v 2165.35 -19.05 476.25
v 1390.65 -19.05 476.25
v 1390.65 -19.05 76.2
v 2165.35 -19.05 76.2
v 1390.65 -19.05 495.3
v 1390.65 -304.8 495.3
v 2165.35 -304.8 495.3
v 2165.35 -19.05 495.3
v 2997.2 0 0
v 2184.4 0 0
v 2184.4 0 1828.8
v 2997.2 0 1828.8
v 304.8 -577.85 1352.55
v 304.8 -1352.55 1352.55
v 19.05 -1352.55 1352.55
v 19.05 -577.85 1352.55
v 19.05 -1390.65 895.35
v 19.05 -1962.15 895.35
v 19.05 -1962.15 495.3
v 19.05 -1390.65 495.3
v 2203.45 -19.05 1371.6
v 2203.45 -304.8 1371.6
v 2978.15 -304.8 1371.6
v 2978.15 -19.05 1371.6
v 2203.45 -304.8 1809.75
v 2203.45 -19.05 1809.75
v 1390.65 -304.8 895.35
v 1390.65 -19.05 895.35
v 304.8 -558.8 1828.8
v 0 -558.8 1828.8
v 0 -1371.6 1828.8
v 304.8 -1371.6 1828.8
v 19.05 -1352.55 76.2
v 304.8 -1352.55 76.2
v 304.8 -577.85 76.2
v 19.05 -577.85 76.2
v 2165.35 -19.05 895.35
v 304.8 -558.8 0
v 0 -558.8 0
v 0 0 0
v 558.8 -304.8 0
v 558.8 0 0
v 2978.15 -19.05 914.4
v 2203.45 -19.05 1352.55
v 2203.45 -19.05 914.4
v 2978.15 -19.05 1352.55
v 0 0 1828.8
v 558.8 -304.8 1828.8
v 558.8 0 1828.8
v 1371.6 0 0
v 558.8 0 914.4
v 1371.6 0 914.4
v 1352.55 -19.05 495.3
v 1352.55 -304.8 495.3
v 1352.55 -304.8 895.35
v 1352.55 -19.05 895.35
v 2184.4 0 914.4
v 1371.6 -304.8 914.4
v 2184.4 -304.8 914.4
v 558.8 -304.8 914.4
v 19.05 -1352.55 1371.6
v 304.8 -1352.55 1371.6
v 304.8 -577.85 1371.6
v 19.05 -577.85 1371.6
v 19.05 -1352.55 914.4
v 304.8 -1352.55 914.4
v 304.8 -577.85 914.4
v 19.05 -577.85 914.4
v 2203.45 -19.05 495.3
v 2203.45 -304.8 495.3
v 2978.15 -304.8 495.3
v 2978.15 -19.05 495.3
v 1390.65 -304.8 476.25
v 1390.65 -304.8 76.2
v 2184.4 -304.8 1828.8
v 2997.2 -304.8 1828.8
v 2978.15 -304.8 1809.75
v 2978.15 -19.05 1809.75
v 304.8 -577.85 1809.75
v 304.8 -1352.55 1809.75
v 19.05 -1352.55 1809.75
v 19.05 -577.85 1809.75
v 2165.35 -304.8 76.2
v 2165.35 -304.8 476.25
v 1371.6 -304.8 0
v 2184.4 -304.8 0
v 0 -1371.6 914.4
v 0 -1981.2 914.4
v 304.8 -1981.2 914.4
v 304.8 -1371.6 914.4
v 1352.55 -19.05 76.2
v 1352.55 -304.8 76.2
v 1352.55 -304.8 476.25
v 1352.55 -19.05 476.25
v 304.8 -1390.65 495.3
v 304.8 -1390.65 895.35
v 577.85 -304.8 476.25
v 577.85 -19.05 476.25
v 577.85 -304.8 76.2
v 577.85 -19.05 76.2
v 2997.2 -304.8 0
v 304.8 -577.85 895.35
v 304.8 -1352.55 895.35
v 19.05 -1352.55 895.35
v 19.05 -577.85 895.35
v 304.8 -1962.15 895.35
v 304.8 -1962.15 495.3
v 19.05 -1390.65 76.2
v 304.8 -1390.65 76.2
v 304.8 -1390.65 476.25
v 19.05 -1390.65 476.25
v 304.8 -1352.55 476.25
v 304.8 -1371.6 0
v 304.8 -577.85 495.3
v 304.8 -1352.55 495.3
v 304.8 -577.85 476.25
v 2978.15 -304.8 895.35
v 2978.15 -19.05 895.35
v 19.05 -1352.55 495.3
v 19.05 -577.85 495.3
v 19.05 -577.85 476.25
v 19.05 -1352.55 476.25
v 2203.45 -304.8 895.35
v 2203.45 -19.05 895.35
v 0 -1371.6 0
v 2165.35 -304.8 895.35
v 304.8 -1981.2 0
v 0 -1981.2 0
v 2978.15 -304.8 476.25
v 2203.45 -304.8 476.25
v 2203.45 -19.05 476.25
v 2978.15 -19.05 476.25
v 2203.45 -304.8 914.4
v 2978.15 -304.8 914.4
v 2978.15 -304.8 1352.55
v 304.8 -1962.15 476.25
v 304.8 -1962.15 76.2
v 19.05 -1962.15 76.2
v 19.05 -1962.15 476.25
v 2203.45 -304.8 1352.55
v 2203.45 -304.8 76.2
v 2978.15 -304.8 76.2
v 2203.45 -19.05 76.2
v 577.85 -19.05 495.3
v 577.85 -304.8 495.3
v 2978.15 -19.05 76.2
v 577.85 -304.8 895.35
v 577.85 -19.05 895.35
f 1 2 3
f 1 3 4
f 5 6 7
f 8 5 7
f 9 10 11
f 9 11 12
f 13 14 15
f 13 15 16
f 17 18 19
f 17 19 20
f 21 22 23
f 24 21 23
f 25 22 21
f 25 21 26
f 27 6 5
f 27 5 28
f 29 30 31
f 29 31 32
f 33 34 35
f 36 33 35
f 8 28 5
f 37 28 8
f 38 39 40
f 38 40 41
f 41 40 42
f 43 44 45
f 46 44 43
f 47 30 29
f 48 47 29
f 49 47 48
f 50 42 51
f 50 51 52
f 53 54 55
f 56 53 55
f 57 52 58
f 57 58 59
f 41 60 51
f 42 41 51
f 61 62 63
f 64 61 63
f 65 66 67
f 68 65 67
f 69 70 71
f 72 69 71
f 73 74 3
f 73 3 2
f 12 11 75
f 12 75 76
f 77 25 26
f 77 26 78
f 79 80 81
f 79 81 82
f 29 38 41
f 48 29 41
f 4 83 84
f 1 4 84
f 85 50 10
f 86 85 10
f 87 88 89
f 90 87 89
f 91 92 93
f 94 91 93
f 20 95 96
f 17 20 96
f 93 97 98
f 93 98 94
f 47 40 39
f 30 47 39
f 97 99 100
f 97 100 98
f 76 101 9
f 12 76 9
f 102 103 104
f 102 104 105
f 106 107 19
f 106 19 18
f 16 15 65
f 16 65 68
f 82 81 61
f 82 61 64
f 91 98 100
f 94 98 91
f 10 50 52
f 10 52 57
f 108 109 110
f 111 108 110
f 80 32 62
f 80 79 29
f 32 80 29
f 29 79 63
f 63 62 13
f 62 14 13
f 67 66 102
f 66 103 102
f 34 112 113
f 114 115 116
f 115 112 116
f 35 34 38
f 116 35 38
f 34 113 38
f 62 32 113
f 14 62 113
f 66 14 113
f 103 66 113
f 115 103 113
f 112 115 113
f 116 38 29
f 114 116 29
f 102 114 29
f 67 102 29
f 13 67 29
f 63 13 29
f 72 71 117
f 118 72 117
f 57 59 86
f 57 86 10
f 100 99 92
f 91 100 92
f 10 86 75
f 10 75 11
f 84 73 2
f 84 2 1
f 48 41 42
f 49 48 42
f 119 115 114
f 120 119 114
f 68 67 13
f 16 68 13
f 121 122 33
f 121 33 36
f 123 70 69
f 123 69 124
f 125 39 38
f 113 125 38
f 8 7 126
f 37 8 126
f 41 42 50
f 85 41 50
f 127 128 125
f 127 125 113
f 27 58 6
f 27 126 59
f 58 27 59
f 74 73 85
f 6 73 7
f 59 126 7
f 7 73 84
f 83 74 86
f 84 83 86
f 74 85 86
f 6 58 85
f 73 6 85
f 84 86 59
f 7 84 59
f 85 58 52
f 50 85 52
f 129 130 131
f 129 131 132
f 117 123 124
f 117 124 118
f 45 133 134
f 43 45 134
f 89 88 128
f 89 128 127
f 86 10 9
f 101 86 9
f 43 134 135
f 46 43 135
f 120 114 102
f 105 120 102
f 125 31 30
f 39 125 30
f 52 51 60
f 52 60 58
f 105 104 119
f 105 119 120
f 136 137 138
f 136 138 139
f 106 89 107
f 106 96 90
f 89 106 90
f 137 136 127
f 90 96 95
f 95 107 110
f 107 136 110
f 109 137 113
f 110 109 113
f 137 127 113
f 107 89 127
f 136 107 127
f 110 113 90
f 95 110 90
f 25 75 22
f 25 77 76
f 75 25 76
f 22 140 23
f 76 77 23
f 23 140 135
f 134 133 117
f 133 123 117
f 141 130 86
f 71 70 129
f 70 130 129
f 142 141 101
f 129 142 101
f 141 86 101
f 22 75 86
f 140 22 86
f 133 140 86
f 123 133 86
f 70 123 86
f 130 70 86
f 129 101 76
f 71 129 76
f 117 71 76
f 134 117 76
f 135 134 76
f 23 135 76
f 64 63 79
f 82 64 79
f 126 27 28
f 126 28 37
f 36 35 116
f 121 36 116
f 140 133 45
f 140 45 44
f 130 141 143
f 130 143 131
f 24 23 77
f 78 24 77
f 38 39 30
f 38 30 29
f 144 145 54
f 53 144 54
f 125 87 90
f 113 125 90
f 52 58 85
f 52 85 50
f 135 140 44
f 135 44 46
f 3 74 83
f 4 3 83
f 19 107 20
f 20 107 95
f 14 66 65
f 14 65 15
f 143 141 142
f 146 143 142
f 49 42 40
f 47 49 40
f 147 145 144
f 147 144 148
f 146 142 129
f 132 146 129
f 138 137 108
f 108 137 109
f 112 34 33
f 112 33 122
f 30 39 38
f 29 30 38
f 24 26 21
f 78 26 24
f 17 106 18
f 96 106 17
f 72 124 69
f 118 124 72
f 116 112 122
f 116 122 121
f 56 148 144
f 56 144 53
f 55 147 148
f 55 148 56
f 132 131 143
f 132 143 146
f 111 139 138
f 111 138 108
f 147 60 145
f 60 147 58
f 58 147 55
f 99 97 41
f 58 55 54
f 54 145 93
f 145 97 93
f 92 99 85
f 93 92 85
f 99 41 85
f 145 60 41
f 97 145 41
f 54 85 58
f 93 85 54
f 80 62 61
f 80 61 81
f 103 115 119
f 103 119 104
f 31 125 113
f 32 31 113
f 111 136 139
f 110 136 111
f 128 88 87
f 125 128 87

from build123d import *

# Parameters (mm, degrees)
F0_W      = 304.8
F0_H      = 609.6
F1_DEPTH  = 914.4
F0_H_2    = 812.8
F2_DEPTH  = 1828.8
F3_DEPTH  = 1828.8
F0_W_2    = 812.8
F0_H_3    = 304.8
F4_DEPTH  = 914.4
F5_DEPTH  = 914.4
F6_DEPTH  = 1828.8
F7_W      = 571.5
F7_H      = 400.05
F7_W_2    = 774.7
F7_H_2    = 438.15
F8_DEPTH  = 285.75
F9_W      = 774.7
F9_H      = 400.05
F9_H_2    = 438.15
F10_DEPTH = 285.75


with BuildPart() as f1:
    # F0 (on Top) → F1 (new body)
    with BuildSketch(Plane.XY):
        with Locations((152.4, -1676.4)):
            Rectangle(F0_W, F0_H)
    extrude(amount=F1_DEPTH)


with BuildPart() as f2:
    # F0 (on Top) → F2 (new body)
    with BuildSketch(Plane.XY):
        with Locations((152.4, -965.2)):
            Rectangle(F0_W, F0_H_2)
    extrude(amount=F2_DEPTH)


with BuildPart() as f3:
    # F0 (on Top) → F3 (new body)
    with BuildSketch(Plane.XY):
        Polygon((558.8, 0), (0, 0), (0, -558.8), (304.8, -558.8), (558.8, -304.8), align=None)
    extrude(amount=F3_DEPTH)


with BuildPart() as f4:
    # F0 (on Top) → F4 (new body)
    with BuildSketch(Plane.XY):
        with Locations((965.2, -152.4)):
            Rectangle(F0_W_2, F0_H_3)
    extrude(amount=F4_DEPTH)


with BuildPart() as f5:
    # F0 (on Top) → F5 (new body)
    with BuildSketch(Plane.XY):
        with Locations((1778, -152.4)):
            Rectangle(F0_W_2, F0_H_3)
    extrude(amount=F5_DEPTH)


with BuildPart() as f6:
    # F0 (on Top) → F6 (new body)
    with BuildSketch(Plane.XY):
        with Locations((2590.8, -152.4)):
            Rectangle(F0_W_2, F0_H_3)
    extrude(amount=F6_DEPTH)


with BuildPart() as f8_tool:
    # F7 (on face) → F8 (new body)
    with BuildSketch(Plane.YZ.offset(304.8)):
        with Locations((-1676.4, 695.325)):
            Rectangle(F7_W, F7_H)
        with Locations((-1676.4, 276.225)):
            Rectangle(F7_W, F7_H)
        with Locations((-965.2, 276.225)):
            Rectangle(F7_W_2, F7_H)
        with Locations((-965.2, 695.325)):
            Rectangle(F7_W_2, F7_H)
        with Locations((-965.2, 1133.475)):
            Rectangle(F7_W_2, F7_H_2)
        with Locations((-965.2, 1590.675)):
            Rectangle(F7_W_2, F7_H_2)
    extrude(amount=-F8_DEPTH)


with BuildPart() as f1_1:
    add(f1.part)

    # F8: cut by f8_tool
    add(f8_tool.part, mode=Mode.SUBTRACT)


with BuildPart() as f2_1:
    add(f2.part)

    # F8: cut by f8_tool
    add(f8_tool.part, mode=Mode.SUBTRACT)


with BuildPart() as f10_tool:
    # F9 (on face) → F10 (new body)
    with BuildSketch(Plane.XZ.offset(304.8)):
        with Locations((965.2, 695.325)):
            Rectangle(F9_W, F9_H)
        with Locations((1778, 695.325)):
            Rectangle(F9_W, F9_H)
        with Locations((2590.8, 695.325)):
            Rectangle(F9_W, F9_H)
        with Locations((965.2, 276.225)):
            Rectangle(F9_W, F9_H)
        with Locations((1778, 276.225)):
            Rectangle(F9_W, F9_H)
        with Locations((2590.8, 276.225)):
            Rectangle(F9_W, F9_H)
        with Locations((2590.8, 1133.475)):
            Rectangle(F9_W, F9_H_2)
        with Locations((2590.8, 1590.675)):
            Rectangle(F9_W, F9_H_2)
    extrude(amount=-F10_DEPTH)


with BuildPart() as f4_1:
    add(f4.part)

    # F10: cut by f10_tool
    add(f10_tool.part, mode=Mode.SUBTRACT)


with BuildPart() as f5_1:
    add(f5.part)

    # F10: cut by f10_tool
    add(f10_tool.part, mode=Mode.SUBTRACT)


with BuildPart() as f6_1:
    add(f6.part)

    # F10: cut by f10_tool
    add(f10_tool.part, mode=Mode.SUBTRACT)


solid = Compound([f3.part, f1_1.part, f2_1.part, f4_1.part, f5_1.part, f6_1.part])
